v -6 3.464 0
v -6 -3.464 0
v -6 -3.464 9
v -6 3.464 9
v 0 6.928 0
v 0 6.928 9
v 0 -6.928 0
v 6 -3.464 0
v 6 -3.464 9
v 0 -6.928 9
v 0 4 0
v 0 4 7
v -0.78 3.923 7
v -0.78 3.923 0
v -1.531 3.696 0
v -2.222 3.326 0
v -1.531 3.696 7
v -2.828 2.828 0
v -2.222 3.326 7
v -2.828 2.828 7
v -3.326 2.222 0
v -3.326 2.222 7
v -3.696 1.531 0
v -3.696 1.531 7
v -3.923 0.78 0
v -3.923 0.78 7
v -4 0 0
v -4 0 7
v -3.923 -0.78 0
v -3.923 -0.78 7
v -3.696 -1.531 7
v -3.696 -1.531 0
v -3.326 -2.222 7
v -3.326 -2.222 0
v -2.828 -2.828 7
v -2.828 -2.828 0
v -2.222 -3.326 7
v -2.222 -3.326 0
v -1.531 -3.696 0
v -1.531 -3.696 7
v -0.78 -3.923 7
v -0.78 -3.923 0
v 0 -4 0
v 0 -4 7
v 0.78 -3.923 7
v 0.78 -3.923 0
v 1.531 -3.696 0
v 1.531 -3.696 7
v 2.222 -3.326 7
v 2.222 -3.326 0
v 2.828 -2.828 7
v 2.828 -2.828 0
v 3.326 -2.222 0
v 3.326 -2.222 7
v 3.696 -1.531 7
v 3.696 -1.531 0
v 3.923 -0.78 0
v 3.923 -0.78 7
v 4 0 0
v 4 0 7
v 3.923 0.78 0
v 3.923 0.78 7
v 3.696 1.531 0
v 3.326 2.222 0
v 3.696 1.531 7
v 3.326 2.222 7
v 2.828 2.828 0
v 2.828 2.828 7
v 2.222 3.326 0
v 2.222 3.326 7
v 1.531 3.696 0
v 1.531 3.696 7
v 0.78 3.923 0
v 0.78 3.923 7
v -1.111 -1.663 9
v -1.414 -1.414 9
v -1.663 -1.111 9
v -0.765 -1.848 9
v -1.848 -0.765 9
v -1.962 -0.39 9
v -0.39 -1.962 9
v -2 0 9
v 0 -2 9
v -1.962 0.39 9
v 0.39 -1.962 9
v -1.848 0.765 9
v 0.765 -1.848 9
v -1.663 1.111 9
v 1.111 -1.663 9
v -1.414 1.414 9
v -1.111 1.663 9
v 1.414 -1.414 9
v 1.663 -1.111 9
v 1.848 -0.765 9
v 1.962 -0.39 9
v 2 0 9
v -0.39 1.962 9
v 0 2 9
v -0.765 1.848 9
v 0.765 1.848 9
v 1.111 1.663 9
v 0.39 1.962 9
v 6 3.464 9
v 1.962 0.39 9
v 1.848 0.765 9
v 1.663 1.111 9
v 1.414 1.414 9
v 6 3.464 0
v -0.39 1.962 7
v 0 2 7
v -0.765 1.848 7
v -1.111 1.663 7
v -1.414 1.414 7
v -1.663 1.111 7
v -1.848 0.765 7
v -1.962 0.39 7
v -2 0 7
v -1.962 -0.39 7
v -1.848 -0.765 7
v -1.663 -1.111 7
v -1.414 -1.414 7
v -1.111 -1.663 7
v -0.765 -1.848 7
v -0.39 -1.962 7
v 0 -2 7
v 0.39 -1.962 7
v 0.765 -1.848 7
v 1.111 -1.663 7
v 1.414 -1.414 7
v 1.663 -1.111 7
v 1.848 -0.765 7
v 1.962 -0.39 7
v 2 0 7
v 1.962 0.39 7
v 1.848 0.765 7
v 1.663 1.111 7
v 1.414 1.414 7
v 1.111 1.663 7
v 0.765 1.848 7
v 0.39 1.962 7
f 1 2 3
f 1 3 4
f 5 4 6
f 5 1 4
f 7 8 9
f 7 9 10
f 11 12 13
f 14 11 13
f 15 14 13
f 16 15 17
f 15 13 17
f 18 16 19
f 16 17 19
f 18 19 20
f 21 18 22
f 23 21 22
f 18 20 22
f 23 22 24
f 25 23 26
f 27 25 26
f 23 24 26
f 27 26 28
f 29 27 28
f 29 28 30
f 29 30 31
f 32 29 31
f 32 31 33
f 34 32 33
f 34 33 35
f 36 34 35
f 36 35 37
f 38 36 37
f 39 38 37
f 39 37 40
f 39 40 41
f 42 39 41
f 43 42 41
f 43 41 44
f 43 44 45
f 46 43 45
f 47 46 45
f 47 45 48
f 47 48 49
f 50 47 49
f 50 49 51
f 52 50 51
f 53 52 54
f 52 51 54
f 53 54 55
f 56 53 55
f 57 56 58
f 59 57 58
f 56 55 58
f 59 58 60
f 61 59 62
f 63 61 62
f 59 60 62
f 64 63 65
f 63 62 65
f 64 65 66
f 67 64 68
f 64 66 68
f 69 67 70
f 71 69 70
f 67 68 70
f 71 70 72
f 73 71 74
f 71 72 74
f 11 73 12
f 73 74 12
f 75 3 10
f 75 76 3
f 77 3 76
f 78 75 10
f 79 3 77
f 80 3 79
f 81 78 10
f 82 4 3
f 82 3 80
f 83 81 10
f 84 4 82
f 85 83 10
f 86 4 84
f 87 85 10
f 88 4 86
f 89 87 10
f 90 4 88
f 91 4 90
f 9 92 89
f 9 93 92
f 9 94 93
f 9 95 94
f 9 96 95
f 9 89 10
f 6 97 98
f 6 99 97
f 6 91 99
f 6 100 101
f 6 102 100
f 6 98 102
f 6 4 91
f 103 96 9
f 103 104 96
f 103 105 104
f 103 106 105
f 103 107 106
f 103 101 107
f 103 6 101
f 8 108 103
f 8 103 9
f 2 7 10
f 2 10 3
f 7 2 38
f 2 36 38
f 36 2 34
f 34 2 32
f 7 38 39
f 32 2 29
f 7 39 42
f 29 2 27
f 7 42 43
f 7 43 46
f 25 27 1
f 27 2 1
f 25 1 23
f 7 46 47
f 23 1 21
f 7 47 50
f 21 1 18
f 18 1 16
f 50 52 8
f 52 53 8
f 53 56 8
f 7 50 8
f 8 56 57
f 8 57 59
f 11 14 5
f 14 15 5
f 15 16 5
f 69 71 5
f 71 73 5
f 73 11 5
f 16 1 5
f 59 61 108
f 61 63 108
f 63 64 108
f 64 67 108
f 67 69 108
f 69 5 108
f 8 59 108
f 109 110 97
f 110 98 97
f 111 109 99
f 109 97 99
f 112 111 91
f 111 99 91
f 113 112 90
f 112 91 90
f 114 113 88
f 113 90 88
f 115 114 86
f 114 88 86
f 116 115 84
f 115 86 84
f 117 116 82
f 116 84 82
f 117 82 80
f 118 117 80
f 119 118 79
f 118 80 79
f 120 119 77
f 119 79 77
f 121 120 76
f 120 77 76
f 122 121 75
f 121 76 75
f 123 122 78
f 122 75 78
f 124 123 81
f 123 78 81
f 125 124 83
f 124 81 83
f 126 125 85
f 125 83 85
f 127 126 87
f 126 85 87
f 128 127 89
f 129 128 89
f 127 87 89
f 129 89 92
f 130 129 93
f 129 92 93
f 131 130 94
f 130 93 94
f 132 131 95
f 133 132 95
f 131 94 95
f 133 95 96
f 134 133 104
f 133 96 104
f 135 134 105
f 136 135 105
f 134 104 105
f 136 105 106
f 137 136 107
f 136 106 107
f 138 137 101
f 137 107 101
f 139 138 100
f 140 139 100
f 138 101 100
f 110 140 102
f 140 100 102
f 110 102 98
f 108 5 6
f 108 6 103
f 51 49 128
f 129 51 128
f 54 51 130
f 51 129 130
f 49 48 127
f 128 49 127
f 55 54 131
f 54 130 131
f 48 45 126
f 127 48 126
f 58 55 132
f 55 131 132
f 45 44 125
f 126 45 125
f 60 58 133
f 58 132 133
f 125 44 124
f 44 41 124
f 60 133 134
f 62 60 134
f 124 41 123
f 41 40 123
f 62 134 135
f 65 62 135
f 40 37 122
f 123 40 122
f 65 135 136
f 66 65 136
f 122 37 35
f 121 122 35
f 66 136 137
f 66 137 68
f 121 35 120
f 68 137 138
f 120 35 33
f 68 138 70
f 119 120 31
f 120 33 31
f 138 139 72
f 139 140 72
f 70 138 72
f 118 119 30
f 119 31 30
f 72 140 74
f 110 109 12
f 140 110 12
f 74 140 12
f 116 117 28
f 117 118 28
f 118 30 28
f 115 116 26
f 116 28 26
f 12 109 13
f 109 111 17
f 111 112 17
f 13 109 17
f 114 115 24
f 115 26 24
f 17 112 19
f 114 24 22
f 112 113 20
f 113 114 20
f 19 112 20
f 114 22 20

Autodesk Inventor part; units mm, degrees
ref_plane "YZ Plane" through (0, 0, 0) normal (1, 0, 0) x (0, 1, 0)
ref_plane "XZ Plane" through (0, 0, 0) normal (0, 1, 0) x (-1, 0, 0)
ref_plane "XY Plane" through (0, 0, 0) normal (0, 0, 1) x (1, 0, 0)
sketch "Sketch1" plane through (0, 0, 0) normal (0, 0, 1) x (1, 0, 0)
  line L0 (0, -6.9282) -> (-6, -3.4641)
  line L1 (-6, -3.4641) -> (-6, 3.4641)
  line L2 (-6, 3.4641) -> (0, 6.9282)
  line L3 (0, 6.9282) -> (6, 3.4641)
  line L4 (6, 3.4641) -> (6, -3.4641)
  line L5 (6, -3.4641) -> (0, -6.9282)
  line L6 (0, 0) -> (0, -16.3015)
  dimension "d0" = 12
extrude "Extrusion1" add sketch "Sketch1" along normal blind 9
hole "Hole1" at (0, 0, 0) direction (0, 0, 1) diameter 4 end through all counterbore diameter 8 counterbore depth 7
thread "Thread1" size "M8x1.25" class "6H" standard "ANSI Metric M Profile" full length
properties part number "HUDSON-1-85"
